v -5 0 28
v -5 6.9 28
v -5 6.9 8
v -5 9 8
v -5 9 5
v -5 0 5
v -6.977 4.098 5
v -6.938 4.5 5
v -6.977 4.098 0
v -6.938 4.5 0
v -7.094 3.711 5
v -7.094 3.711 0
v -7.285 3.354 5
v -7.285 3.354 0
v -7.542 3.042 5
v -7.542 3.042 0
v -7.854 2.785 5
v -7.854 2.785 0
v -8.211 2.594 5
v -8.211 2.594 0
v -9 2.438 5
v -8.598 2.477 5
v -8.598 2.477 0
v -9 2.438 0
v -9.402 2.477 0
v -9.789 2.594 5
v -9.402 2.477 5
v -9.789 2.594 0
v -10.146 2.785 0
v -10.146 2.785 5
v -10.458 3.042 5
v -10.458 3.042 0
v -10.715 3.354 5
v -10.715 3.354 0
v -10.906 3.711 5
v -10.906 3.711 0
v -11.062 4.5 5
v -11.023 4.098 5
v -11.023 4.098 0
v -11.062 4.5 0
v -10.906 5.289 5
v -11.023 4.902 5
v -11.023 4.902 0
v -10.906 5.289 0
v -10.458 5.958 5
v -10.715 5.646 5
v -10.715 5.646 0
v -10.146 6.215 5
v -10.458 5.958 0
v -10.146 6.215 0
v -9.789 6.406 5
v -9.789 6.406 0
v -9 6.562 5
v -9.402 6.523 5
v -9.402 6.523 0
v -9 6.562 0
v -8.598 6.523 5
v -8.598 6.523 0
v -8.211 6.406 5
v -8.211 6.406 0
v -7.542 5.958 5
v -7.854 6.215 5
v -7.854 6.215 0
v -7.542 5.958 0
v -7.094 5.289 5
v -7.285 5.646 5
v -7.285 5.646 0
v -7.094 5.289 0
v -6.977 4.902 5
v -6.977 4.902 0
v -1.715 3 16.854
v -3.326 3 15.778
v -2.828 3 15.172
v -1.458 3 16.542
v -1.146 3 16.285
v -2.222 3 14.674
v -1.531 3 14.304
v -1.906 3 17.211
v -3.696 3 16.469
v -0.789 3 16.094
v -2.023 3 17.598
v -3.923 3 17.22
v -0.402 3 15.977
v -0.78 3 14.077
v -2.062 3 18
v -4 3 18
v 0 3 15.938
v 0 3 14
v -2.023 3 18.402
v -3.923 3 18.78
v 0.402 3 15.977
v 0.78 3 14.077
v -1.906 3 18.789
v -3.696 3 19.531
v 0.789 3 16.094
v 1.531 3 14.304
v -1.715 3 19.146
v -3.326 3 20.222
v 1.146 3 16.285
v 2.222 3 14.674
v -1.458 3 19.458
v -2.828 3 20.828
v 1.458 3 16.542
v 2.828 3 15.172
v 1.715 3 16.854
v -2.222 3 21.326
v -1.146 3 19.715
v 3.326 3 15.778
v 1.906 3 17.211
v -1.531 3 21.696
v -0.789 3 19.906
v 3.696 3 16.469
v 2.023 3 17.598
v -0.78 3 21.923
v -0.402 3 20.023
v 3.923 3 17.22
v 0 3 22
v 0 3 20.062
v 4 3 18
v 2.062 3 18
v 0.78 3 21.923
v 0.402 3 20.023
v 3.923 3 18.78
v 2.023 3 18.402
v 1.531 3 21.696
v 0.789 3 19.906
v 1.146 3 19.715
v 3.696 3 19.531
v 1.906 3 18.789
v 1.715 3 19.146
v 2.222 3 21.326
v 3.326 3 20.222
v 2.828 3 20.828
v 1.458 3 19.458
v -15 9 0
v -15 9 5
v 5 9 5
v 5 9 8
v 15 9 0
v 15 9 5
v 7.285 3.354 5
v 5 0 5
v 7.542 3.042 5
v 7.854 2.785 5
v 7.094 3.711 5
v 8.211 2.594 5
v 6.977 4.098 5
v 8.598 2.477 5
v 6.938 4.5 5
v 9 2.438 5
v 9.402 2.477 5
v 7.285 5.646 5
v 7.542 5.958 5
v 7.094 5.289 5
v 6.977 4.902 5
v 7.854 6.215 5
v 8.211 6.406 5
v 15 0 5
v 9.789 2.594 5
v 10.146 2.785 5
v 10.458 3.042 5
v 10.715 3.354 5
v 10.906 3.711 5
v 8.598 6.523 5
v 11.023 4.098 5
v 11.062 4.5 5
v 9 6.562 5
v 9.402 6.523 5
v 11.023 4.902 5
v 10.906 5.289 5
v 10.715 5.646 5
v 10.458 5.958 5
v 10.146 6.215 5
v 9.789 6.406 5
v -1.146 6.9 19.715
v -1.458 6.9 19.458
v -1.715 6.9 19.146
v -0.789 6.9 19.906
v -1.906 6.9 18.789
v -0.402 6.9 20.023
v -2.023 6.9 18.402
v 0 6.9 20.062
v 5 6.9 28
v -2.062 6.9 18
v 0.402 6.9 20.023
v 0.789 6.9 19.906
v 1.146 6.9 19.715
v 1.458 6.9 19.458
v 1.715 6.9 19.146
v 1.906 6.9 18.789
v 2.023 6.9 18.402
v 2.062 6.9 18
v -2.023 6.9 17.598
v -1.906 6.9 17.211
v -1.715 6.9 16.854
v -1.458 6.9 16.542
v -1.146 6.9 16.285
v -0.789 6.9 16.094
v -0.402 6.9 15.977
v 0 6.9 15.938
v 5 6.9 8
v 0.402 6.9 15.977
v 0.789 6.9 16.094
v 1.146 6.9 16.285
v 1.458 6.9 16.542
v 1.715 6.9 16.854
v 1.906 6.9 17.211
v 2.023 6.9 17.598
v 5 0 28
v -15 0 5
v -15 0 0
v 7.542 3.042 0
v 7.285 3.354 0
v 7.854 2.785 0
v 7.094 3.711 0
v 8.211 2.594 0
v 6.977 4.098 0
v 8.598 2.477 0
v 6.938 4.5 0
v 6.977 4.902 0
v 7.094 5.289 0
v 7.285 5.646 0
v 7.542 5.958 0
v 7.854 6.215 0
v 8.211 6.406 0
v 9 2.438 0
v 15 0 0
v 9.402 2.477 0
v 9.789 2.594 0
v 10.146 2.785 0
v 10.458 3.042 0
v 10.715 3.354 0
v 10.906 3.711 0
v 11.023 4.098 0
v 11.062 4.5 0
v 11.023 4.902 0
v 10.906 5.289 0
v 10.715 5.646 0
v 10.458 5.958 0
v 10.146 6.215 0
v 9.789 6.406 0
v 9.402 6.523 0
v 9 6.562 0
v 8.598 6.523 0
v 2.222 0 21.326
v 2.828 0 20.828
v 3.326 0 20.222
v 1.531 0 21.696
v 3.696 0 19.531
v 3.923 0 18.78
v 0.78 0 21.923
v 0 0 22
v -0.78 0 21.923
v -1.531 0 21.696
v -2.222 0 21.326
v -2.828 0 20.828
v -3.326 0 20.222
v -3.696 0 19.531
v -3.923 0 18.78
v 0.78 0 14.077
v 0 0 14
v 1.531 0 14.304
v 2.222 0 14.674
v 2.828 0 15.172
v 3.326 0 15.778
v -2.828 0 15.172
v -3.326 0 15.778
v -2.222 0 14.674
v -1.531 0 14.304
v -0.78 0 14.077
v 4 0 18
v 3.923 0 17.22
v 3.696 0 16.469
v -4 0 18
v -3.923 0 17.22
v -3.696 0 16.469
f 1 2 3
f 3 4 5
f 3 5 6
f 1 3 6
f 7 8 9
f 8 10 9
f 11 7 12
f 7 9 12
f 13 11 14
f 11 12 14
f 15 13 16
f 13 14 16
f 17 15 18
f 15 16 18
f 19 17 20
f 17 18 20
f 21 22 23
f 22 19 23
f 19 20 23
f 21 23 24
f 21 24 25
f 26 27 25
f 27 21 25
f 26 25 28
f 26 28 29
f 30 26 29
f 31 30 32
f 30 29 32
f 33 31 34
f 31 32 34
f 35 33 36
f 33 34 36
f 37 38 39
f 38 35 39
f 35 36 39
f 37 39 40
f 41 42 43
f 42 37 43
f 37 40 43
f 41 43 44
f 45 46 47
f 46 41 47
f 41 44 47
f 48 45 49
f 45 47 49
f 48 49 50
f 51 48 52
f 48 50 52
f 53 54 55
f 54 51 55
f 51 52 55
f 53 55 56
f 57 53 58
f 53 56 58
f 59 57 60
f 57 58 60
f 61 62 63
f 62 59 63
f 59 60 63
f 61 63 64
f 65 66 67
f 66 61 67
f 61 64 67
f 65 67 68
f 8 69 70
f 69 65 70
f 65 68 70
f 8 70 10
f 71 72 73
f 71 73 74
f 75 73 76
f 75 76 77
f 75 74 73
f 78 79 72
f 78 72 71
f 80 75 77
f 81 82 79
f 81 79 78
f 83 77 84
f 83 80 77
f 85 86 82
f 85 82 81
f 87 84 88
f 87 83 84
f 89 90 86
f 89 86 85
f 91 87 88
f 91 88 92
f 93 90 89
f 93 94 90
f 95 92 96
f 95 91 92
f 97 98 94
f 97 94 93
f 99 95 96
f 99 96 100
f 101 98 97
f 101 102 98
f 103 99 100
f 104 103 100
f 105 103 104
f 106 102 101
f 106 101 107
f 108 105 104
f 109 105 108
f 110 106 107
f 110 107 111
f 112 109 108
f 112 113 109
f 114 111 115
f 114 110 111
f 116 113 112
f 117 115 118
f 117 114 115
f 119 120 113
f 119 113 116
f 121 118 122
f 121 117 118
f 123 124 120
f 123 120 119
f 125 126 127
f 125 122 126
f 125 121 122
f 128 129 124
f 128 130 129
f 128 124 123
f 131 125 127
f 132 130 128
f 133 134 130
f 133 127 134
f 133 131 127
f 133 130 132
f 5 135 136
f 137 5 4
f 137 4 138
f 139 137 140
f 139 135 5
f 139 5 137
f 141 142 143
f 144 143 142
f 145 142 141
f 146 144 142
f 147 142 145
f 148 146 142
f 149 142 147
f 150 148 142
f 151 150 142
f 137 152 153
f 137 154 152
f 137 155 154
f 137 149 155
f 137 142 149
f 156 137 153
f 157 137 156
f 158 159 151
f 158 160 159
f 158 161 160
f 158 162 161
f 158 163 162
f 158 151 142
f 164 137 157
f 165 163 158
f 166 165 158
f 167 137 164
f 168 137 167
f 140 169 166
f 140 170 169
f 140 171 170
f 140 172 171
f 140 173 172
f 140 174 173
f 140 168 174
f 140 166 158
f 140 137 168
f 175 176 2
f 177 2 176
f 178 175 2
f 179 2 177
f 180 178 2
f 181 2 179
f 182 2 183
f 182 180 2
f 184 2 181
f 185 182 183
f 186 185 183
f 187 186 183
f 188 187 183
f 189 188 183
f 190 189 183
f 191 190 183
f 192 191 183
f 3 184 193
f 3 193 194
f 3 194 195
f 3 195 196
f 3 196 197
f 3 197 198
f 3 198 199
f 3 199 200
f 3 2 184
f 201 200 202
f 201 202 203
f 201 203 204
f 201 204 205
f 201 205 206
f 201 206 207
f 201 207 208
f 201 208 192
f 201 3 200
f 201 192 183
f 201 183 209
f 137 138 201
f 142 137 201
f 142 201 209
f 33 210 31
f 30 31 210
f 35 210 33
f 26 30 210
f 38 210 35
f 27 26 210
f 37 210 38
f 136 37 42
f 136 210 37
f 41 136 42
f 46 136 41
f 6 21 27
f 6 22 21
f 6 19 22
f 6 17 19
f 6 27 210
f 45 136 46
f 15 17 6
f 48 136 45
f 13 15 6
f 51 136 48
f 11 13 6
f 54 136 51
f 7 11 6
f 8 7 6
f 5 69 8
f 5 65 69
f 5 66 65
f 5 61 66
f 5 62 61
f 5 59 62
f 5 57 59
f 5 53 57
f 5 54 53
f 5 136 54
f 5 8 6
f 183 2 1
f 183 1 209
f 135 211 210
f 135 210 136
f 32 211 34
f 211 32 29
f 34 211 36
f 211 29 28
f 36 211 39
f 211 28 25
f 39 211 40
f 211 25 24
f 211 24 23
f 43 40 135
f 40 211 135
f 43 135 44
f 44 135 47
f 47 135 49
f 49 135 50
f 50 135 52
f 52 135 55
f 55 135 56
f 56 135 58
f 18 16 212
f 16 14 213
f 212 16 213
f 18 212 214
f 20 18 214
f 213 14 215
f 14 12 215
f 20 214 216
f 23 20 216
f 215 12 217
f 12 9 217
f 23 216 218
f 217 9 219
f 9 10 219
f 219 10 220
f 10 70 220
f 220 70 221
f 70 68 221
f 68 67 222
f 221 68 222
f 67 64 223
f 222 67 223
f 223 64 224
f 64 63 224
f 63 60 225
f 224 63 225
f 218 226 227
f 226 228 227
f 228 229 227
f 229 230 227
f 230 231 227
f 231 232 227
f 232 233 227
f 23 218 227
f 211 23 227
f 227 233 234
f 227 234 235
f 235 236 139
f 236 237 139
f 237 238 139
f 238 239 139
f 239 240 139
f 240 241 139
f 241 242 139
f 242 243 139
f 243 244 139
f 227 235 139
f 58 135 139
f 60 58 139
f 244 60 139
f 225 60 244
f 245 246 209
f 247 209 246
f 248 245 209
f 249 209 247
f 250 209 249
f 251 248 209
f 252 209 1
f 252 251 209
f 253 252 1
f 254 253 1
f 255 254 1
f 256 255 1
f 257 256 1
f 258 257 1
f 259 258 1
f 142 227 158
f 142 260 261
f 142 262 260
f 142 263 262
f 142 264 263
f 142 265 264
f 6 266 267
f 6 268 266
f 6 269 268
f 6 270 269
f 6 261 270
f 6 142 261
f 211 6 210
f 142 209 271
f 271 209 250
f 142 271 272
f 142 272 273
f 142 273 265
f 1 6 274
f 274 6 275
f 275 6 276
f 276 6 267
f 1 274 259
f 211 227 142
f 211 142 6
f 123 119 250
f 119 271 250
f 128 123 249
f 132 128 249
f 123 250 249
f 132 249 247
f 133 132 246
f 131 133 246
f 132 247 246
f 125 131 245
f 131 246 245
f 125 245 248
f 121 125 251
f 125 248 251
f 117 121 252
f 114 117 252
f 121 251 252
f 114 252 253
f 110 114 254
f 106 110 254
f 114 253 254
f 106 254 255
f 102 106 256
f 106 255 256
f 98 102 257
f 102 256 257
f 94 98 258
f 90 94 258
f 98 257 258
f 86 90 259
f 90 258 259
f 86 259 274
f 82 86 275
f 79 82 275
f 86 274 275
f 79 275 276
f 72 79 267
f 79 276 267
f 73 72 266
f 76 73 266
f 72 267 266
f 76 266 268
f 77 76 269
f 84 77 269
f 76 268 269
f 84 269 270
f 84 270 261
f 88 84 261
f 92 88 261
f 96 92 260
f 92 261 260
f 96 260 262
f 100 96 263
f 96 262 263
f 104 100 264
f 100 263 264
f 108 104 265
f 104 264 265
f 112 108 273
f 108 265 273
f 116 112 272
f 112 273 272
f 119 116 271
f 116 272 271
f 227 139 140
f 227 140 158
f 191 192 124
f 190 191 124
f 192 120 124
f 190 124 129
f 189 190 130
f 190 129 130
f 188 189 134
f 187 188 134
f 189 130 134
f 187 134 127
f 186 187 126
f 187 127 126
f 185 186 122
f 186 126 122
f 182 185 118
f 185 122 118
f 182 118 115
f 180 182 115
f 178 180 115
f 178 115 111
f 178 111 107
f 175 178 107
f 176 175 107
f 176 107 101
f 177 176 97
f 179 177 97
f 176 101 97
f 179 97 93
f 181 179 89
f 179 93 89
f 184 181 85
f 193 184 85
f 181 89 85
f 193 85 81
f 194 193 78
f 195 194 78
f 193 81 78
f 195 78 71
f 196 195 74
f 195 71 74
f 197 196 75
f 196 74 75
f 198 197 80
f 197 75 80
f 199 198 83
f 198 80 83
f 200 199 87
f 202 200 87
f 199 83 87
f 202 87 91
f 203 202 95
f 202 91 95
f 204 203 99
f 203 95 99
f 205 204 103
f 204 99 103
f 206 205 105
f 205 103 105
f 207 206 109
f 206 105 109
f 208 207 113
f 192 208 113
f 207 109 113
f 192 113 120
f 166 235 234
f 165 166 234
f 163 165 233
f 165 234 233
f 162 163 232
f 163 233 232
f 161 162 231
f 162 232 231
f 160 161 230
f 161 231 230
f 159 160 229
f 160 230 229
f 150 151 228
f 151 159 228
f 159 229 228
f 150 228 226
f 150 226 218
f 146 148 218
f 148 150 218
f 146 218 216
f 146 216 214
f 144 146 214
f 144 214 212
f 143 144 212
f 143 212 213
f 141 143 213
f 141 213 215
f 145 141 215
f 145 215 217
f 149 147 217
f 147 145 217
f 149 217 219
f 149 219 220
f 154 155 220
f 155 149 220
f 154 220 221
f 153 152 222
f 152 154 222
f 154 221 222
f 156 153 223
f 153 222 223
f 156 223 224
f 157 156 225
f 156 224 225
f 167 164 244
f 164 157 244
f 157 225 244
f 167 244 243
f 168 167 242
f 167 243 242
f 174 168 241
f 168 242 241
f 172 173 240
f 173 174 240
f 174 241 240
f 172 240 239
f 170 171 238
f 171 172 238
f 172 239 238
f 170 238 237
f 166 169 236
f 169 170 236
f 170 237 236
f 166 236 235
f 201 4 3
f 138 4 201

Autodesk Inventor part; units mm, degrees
ref_plane "YZ Plane" through (0, 0, 0) normal (1, 0, 0) x (0, 1, 0)
ref_plane "XZ Plane" through (0, 0, 0) normal (0, 1, 0) x (-1, 0, 0)
ref_plane "XY Plane" through (0, 0, 0) normal (0, 0, 1) x (1, 0, 0)
sketch "Sketch1" plane through (0, 0, 0) normal (0, 0, 1) x (1, 0, 0)
  line L0 (15, 0) -> (-15, 0)
  line L1 (-15, 0) -> (-15, 9)
  line L2 (-15, 9) -> (15, 9)
  line L3 (15, 9) -> (15, 0)
  line L4 (0, 10.8) -> (0, -1.8) projected
  circle A0 centre (9, 4.5) radius 2.0625
  circle A1 centre (-9, 4.5) radius 2.0625
  point P0 (0, 0)
  dimension "d0" = 9
  dimension "d1" = 30
  dimension "d4" = 4.125
  dimension "d5" = 6
  dimension "d6" = 4.5
extrude "Extrusion1" add sketch "Sketch1" along normal blind 5
sketch "Sketch2" plane through (0, 0, 5) normal (0, 0, 1) x (1, 0, 0)
  line L0 (-15, 0) -> (15, 0) projected
  line L1 (15, 9) -> (-15, 9) projected
  line L2 (5, 0) -> (-5, 0)
  line L3 (-5, 0) -> (-5, 9)
  line L4 (-5, 9) -> (5, 9)
  line L5 (5, 9) -> (5, 0)
  line L6 (0, 10.8) -> (0, -1.8) projected
  point P0 (0, 0)
  dimension "d7" = 10
extrude "Extrusion2" add sketch "Sketch2" along normal blind 3
sketch "Sketch3" plane through (0, 0, 8) normal (0, 0, 1) x (1, 0, 0)
  line L0 (-5, 9) -> (-5, 0) projected
  line L1 (5, 0) -> (-5, 0)
  line L2 (-5, 0) -> (-5, 6.9)
  line L3 (-5, 6.9) -> (5, 6.9)
  line L4 (5, 6.9) -> (5, 0)
  point P0 (0, 0)
  dimension "d10" = 6.9
extrude "Extrusion3" add sketch "Sketch3" along normal blind 20
sketch "Sketch4" plane through (-15, 0, 0) normal (0, -1, 0) x (1, 0, 0)
  circle A0 centre (15, 18) radius 4
  circle A1 centre (15, 18) radius 2.0625
  line L0 (10, 28) -> (20, 28) projected
  point P0 (15, 0)
  dimension "d13" = 8
  dimension "d14" = 4.125
  dimension "d19" = 10
extrude "Extrusion4" cut sketch "Sketch4" against normal blind 3 contours A0 | A1
extrude "Extrusion5" cut sketch "Sketch4" against normal up to next contours A1
properties part number "Linear Bearing Adapter Arm"
